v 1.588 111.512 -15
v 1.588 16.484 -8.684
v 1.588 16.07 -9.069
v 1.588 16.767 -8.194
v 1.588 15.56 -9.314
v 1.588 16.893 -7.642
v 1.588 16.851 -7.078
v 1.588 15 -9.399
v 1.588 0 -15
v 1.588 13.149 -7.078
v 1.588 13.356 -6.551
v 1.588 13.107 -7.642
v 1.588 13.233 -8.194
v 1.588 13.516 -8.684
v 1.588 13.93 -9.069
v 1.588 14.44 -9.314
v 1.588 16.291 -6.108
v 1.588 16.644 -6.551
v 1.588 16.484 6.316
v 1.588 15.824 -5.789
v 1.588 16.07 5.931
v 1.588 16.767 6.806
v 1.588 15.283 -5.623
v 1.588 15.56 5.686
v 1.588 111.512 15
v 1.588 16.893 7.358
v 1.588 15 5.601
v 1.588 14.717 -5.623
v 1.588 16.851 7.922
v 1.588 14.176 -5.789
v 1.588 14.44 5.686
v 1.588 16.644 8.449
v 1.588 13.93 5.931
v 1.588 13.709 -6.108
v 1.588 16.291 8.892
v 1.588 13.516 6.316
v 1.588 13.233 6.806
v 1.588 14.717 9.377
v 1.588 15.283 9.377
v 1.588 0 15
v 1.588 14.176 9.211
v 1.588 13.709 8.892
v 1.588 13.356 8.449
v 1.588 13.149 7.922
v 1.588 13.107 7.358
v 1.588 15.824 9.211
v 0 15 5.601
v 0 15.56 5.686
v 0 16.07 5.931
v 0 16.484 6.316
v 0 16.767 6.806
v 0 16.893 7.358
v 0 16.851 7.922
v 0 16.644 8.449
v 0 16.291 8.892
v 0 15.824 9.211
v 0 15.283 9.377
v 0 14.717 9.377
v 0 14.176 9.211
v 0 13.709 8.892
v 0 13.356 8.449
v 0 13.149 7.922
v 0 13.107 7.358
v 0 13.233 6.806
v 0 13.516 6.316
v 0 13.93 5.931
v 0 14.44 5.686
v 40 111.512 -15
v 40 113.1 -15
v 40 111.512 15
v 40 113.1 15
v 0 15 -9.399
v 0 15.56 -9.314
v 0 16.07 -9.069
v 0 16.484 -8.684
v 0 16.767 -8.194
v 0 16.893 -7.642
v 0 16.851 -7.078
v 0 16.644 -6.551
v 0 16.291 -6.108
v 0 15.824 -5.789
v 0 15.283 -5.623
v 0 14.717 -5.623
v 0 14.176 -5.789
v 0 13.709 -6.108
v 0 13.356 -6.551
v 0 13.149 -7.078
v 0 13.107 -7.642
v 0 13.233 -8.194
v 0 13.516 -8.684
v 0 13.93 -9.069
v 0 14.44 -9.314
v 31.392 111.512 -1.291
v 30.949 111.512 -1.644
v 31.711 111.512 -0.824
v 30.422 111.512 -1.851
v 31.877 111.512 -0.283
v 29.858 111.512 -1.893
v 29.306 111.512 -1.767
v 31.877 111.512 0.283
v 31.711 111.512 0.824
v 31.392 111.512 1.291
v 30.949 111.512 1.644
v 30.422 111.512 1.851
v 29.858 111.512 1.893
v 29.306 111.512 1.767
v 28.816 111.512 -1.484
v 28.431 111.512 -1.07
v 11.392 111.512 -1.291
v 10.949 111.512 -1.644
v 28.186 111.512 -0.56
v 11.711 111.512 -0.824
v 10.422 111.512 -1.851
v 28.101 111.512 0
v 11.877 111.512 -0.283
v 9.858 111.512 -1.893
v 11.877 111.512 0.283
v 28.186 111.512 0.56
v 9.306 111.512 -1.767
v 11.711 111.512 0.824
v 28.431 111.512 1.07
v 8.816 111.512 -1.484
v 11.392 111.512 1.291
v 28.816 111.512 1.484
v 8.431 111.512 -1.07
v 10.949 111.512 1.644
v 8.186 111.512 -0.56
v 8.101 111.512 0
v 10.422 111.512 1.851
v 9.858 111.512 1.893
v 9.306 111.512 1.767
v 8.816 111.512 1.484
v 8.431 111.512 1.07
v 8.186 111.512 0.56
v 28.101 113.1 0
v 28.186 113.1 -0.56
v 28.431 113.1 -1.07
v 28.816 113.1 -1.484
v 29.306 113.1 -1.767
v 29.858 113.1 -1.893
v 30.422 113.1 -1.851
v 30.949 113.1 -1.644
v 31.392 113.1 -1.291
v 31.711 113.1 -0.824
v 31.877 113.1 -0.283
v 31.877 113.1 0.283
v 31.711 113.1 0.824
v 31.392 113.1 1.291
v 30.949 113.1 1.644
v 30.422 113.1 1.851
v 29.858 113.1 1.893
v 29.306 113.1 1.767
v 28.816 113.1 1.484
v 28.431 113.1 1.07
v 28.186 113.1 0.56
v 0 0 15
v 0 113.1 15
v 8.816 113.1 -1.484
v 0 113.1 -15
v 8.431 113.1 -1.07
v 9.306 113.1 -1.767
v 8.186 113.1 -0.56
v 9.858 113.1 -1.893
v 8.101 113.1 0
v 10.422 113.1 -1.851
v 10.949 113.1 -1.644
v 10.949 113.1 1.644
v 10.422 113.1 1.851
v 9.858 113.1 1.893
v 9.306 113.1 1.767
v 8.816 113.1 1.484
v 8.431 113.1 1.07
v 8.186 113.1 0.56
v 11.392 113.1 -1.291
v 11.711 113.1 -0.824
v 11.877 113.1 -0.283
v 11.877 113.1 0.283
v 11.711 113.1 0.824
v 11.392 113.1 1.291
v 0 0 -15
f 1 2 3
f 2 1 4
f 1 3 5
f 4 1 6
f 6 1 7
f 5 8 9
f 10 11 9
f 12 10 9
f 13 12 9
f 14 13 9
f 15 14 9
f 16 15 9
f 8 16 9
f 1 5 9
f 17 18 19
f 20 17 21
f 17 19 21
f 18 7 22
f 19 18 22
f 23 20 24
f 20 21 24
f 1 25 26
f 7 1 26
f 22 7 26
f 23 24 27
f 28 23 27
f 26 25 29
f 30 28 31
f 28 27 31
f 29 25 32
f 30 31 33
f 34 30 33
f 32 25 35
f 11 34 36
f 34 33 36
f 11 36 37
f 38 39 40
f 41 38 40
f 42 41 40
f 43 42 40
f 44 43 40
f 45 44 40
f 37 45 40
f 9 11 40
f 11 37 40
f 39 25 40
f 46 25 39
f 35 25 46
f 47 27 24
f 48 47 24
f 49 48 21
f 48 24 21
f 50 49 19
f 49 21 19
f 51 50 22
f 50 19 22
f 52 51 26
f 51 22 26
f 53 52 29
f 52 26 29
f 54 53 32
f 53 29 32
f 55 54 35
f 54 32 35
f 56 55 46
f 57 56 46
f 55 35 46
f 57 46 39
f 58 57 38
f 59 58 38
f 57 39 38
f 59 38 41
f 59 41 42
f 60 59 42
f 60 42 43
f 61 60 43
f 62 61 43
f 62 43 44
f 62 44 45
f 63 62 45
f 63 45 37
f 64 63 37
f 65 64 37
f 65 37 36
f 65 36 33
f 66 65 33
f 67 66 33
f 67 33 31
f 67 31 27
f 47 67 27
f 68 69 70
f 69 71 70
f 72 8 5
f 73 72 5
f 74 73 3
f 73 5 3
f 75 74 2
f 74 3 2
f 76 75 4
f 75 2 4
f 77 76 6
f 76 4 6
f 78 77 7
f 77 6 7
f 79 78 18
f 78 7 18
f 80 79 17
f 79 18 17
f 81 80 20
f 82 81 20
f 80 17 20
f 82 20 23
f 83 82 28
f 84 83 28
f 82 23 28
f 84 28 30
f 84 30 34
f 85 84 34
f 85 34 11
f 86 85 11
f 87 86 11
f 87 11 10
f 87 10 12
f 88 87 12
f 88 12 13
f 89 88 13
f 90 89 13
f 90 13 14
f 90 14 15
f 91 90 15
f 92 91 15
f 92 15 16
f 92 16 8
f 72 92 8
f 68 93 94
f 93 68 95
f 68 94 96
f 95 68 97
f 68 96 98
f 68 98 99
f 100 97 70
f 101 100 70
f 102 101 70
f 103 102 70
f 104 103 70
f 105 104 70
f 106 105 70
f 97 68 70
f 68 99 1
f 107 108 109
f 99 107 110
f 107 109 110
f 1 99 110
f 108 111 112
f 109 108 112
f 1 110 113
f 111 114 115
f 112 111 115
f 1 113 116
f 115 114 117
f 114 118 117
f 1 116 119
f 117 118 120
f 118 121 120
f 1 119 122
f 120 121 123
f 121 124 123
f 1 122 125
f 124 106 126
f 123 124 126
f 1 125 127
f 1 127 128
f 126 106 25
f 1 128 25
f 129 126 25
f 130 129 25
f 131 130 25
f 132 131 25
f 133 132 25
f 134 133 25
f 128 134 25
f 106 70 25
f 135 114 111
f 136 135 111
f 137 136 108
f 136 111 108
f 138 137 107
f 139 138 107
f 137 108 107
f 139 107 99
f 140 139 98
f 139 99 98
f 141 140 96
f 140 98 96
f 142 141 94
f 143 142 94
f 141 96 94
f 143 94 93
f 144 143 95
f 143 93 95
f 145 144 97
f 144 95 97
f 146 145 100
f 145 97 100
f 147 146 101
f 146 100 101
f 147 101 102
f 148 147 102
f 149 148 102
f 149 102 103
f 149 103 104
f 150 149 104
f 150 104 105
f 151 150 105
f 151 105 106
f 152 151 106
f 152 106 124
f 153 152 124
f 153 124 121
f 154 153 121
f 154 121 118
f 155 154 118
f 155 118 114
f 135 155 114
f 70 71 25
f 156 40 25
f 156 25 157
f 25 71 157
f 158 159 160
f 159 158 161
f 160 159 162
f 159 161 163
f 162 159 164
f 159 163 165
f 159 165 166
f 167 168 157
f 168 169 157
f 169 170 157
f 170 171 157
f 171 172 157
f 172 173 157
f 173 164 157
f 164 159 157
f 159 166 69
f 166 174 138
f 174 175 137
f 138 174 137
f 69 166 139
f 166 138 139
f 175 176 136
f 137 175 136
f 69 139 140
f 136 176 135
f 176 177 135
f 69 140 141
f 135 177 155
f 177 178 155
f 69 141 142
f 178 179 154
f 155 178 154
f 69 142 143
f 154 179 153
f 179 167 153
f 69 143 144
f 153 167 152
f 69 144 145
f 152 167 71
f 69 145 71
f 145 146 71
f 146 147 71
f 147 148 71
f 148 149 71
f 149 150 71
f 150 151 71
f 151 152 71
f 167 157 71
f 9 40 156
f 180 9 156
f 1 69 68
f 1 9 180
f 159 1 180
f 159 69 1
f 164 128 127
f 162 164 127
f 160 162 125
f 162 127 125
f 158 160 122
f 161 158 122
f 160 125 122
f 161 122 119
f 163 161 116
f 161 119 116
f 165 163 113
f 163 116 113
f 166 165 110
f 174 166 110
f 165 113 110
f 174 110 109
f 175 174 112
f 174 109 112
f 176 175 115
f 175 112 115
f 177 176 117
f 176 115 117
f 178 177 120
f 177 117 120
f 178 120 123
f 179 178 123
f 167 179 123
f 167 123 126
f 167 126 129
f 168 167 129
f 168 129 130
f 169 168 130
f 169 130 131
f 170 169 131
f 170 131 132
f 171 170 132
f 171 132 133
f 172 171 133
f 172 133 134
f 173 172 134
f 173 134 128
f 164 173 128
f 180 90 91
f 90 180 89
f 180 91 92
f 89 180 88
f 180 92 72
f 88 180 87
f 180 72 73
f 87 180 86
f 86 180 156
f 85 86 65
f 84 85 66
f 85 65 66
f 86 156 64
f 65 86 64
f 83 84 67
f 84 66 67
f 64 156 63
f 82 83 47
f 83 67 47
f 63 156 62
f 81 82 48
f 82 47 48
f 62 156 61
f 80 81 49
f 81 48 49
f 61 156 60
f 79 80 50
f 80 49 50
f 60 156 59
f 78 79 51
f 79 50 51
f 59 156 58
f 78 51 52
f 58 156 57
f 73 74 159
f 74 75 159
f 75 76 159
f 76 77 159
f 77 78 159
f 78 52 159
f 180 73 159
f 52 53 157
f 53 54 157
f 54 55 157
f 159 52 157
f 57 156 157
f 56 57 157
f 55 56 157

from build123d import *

# Parameters (mm, degrees)
BOSS_EXTRUDE1_DEPTH   = 15
F_6_CLEARANCE_HOLE1_D = 3.7973
F_6_CLEARANCE_HOLE2_D = 3.7973


with BuildPart() as part:
    # Sketch1 → Boss-Extrude1 (new, symmetric)
    with BuildSketch(Plane.XY):
        Polygon((0, 0), (0, 113.1), (40, 113.1), (40, 111.5125), (1.5875, 111.5125), (1.5875, 0), align=None)
    extrude(amount=BOSS_EXTRUDE1_DEPTH, both=True)

    # #6 Clearance Hole1 (through all)
    with Locations(Plane.ZY):
        with Locations((-7.5, 15), (7.5, 15)):
            Hole(F_6_CLEARANCE_HOLE1_D / 2)

    # #6 Clearance Hole2 (through all)
    with Locations(Plane(origin=(0, 113.1, 0), x_dir=(1, 0, 0), z_dir=(0, 1, 0))):
        with Locations((10, 0), (30, 0)):
            Hole(F_6_CLEARANCE_HOLE2_D / 2)


solid = part.part
